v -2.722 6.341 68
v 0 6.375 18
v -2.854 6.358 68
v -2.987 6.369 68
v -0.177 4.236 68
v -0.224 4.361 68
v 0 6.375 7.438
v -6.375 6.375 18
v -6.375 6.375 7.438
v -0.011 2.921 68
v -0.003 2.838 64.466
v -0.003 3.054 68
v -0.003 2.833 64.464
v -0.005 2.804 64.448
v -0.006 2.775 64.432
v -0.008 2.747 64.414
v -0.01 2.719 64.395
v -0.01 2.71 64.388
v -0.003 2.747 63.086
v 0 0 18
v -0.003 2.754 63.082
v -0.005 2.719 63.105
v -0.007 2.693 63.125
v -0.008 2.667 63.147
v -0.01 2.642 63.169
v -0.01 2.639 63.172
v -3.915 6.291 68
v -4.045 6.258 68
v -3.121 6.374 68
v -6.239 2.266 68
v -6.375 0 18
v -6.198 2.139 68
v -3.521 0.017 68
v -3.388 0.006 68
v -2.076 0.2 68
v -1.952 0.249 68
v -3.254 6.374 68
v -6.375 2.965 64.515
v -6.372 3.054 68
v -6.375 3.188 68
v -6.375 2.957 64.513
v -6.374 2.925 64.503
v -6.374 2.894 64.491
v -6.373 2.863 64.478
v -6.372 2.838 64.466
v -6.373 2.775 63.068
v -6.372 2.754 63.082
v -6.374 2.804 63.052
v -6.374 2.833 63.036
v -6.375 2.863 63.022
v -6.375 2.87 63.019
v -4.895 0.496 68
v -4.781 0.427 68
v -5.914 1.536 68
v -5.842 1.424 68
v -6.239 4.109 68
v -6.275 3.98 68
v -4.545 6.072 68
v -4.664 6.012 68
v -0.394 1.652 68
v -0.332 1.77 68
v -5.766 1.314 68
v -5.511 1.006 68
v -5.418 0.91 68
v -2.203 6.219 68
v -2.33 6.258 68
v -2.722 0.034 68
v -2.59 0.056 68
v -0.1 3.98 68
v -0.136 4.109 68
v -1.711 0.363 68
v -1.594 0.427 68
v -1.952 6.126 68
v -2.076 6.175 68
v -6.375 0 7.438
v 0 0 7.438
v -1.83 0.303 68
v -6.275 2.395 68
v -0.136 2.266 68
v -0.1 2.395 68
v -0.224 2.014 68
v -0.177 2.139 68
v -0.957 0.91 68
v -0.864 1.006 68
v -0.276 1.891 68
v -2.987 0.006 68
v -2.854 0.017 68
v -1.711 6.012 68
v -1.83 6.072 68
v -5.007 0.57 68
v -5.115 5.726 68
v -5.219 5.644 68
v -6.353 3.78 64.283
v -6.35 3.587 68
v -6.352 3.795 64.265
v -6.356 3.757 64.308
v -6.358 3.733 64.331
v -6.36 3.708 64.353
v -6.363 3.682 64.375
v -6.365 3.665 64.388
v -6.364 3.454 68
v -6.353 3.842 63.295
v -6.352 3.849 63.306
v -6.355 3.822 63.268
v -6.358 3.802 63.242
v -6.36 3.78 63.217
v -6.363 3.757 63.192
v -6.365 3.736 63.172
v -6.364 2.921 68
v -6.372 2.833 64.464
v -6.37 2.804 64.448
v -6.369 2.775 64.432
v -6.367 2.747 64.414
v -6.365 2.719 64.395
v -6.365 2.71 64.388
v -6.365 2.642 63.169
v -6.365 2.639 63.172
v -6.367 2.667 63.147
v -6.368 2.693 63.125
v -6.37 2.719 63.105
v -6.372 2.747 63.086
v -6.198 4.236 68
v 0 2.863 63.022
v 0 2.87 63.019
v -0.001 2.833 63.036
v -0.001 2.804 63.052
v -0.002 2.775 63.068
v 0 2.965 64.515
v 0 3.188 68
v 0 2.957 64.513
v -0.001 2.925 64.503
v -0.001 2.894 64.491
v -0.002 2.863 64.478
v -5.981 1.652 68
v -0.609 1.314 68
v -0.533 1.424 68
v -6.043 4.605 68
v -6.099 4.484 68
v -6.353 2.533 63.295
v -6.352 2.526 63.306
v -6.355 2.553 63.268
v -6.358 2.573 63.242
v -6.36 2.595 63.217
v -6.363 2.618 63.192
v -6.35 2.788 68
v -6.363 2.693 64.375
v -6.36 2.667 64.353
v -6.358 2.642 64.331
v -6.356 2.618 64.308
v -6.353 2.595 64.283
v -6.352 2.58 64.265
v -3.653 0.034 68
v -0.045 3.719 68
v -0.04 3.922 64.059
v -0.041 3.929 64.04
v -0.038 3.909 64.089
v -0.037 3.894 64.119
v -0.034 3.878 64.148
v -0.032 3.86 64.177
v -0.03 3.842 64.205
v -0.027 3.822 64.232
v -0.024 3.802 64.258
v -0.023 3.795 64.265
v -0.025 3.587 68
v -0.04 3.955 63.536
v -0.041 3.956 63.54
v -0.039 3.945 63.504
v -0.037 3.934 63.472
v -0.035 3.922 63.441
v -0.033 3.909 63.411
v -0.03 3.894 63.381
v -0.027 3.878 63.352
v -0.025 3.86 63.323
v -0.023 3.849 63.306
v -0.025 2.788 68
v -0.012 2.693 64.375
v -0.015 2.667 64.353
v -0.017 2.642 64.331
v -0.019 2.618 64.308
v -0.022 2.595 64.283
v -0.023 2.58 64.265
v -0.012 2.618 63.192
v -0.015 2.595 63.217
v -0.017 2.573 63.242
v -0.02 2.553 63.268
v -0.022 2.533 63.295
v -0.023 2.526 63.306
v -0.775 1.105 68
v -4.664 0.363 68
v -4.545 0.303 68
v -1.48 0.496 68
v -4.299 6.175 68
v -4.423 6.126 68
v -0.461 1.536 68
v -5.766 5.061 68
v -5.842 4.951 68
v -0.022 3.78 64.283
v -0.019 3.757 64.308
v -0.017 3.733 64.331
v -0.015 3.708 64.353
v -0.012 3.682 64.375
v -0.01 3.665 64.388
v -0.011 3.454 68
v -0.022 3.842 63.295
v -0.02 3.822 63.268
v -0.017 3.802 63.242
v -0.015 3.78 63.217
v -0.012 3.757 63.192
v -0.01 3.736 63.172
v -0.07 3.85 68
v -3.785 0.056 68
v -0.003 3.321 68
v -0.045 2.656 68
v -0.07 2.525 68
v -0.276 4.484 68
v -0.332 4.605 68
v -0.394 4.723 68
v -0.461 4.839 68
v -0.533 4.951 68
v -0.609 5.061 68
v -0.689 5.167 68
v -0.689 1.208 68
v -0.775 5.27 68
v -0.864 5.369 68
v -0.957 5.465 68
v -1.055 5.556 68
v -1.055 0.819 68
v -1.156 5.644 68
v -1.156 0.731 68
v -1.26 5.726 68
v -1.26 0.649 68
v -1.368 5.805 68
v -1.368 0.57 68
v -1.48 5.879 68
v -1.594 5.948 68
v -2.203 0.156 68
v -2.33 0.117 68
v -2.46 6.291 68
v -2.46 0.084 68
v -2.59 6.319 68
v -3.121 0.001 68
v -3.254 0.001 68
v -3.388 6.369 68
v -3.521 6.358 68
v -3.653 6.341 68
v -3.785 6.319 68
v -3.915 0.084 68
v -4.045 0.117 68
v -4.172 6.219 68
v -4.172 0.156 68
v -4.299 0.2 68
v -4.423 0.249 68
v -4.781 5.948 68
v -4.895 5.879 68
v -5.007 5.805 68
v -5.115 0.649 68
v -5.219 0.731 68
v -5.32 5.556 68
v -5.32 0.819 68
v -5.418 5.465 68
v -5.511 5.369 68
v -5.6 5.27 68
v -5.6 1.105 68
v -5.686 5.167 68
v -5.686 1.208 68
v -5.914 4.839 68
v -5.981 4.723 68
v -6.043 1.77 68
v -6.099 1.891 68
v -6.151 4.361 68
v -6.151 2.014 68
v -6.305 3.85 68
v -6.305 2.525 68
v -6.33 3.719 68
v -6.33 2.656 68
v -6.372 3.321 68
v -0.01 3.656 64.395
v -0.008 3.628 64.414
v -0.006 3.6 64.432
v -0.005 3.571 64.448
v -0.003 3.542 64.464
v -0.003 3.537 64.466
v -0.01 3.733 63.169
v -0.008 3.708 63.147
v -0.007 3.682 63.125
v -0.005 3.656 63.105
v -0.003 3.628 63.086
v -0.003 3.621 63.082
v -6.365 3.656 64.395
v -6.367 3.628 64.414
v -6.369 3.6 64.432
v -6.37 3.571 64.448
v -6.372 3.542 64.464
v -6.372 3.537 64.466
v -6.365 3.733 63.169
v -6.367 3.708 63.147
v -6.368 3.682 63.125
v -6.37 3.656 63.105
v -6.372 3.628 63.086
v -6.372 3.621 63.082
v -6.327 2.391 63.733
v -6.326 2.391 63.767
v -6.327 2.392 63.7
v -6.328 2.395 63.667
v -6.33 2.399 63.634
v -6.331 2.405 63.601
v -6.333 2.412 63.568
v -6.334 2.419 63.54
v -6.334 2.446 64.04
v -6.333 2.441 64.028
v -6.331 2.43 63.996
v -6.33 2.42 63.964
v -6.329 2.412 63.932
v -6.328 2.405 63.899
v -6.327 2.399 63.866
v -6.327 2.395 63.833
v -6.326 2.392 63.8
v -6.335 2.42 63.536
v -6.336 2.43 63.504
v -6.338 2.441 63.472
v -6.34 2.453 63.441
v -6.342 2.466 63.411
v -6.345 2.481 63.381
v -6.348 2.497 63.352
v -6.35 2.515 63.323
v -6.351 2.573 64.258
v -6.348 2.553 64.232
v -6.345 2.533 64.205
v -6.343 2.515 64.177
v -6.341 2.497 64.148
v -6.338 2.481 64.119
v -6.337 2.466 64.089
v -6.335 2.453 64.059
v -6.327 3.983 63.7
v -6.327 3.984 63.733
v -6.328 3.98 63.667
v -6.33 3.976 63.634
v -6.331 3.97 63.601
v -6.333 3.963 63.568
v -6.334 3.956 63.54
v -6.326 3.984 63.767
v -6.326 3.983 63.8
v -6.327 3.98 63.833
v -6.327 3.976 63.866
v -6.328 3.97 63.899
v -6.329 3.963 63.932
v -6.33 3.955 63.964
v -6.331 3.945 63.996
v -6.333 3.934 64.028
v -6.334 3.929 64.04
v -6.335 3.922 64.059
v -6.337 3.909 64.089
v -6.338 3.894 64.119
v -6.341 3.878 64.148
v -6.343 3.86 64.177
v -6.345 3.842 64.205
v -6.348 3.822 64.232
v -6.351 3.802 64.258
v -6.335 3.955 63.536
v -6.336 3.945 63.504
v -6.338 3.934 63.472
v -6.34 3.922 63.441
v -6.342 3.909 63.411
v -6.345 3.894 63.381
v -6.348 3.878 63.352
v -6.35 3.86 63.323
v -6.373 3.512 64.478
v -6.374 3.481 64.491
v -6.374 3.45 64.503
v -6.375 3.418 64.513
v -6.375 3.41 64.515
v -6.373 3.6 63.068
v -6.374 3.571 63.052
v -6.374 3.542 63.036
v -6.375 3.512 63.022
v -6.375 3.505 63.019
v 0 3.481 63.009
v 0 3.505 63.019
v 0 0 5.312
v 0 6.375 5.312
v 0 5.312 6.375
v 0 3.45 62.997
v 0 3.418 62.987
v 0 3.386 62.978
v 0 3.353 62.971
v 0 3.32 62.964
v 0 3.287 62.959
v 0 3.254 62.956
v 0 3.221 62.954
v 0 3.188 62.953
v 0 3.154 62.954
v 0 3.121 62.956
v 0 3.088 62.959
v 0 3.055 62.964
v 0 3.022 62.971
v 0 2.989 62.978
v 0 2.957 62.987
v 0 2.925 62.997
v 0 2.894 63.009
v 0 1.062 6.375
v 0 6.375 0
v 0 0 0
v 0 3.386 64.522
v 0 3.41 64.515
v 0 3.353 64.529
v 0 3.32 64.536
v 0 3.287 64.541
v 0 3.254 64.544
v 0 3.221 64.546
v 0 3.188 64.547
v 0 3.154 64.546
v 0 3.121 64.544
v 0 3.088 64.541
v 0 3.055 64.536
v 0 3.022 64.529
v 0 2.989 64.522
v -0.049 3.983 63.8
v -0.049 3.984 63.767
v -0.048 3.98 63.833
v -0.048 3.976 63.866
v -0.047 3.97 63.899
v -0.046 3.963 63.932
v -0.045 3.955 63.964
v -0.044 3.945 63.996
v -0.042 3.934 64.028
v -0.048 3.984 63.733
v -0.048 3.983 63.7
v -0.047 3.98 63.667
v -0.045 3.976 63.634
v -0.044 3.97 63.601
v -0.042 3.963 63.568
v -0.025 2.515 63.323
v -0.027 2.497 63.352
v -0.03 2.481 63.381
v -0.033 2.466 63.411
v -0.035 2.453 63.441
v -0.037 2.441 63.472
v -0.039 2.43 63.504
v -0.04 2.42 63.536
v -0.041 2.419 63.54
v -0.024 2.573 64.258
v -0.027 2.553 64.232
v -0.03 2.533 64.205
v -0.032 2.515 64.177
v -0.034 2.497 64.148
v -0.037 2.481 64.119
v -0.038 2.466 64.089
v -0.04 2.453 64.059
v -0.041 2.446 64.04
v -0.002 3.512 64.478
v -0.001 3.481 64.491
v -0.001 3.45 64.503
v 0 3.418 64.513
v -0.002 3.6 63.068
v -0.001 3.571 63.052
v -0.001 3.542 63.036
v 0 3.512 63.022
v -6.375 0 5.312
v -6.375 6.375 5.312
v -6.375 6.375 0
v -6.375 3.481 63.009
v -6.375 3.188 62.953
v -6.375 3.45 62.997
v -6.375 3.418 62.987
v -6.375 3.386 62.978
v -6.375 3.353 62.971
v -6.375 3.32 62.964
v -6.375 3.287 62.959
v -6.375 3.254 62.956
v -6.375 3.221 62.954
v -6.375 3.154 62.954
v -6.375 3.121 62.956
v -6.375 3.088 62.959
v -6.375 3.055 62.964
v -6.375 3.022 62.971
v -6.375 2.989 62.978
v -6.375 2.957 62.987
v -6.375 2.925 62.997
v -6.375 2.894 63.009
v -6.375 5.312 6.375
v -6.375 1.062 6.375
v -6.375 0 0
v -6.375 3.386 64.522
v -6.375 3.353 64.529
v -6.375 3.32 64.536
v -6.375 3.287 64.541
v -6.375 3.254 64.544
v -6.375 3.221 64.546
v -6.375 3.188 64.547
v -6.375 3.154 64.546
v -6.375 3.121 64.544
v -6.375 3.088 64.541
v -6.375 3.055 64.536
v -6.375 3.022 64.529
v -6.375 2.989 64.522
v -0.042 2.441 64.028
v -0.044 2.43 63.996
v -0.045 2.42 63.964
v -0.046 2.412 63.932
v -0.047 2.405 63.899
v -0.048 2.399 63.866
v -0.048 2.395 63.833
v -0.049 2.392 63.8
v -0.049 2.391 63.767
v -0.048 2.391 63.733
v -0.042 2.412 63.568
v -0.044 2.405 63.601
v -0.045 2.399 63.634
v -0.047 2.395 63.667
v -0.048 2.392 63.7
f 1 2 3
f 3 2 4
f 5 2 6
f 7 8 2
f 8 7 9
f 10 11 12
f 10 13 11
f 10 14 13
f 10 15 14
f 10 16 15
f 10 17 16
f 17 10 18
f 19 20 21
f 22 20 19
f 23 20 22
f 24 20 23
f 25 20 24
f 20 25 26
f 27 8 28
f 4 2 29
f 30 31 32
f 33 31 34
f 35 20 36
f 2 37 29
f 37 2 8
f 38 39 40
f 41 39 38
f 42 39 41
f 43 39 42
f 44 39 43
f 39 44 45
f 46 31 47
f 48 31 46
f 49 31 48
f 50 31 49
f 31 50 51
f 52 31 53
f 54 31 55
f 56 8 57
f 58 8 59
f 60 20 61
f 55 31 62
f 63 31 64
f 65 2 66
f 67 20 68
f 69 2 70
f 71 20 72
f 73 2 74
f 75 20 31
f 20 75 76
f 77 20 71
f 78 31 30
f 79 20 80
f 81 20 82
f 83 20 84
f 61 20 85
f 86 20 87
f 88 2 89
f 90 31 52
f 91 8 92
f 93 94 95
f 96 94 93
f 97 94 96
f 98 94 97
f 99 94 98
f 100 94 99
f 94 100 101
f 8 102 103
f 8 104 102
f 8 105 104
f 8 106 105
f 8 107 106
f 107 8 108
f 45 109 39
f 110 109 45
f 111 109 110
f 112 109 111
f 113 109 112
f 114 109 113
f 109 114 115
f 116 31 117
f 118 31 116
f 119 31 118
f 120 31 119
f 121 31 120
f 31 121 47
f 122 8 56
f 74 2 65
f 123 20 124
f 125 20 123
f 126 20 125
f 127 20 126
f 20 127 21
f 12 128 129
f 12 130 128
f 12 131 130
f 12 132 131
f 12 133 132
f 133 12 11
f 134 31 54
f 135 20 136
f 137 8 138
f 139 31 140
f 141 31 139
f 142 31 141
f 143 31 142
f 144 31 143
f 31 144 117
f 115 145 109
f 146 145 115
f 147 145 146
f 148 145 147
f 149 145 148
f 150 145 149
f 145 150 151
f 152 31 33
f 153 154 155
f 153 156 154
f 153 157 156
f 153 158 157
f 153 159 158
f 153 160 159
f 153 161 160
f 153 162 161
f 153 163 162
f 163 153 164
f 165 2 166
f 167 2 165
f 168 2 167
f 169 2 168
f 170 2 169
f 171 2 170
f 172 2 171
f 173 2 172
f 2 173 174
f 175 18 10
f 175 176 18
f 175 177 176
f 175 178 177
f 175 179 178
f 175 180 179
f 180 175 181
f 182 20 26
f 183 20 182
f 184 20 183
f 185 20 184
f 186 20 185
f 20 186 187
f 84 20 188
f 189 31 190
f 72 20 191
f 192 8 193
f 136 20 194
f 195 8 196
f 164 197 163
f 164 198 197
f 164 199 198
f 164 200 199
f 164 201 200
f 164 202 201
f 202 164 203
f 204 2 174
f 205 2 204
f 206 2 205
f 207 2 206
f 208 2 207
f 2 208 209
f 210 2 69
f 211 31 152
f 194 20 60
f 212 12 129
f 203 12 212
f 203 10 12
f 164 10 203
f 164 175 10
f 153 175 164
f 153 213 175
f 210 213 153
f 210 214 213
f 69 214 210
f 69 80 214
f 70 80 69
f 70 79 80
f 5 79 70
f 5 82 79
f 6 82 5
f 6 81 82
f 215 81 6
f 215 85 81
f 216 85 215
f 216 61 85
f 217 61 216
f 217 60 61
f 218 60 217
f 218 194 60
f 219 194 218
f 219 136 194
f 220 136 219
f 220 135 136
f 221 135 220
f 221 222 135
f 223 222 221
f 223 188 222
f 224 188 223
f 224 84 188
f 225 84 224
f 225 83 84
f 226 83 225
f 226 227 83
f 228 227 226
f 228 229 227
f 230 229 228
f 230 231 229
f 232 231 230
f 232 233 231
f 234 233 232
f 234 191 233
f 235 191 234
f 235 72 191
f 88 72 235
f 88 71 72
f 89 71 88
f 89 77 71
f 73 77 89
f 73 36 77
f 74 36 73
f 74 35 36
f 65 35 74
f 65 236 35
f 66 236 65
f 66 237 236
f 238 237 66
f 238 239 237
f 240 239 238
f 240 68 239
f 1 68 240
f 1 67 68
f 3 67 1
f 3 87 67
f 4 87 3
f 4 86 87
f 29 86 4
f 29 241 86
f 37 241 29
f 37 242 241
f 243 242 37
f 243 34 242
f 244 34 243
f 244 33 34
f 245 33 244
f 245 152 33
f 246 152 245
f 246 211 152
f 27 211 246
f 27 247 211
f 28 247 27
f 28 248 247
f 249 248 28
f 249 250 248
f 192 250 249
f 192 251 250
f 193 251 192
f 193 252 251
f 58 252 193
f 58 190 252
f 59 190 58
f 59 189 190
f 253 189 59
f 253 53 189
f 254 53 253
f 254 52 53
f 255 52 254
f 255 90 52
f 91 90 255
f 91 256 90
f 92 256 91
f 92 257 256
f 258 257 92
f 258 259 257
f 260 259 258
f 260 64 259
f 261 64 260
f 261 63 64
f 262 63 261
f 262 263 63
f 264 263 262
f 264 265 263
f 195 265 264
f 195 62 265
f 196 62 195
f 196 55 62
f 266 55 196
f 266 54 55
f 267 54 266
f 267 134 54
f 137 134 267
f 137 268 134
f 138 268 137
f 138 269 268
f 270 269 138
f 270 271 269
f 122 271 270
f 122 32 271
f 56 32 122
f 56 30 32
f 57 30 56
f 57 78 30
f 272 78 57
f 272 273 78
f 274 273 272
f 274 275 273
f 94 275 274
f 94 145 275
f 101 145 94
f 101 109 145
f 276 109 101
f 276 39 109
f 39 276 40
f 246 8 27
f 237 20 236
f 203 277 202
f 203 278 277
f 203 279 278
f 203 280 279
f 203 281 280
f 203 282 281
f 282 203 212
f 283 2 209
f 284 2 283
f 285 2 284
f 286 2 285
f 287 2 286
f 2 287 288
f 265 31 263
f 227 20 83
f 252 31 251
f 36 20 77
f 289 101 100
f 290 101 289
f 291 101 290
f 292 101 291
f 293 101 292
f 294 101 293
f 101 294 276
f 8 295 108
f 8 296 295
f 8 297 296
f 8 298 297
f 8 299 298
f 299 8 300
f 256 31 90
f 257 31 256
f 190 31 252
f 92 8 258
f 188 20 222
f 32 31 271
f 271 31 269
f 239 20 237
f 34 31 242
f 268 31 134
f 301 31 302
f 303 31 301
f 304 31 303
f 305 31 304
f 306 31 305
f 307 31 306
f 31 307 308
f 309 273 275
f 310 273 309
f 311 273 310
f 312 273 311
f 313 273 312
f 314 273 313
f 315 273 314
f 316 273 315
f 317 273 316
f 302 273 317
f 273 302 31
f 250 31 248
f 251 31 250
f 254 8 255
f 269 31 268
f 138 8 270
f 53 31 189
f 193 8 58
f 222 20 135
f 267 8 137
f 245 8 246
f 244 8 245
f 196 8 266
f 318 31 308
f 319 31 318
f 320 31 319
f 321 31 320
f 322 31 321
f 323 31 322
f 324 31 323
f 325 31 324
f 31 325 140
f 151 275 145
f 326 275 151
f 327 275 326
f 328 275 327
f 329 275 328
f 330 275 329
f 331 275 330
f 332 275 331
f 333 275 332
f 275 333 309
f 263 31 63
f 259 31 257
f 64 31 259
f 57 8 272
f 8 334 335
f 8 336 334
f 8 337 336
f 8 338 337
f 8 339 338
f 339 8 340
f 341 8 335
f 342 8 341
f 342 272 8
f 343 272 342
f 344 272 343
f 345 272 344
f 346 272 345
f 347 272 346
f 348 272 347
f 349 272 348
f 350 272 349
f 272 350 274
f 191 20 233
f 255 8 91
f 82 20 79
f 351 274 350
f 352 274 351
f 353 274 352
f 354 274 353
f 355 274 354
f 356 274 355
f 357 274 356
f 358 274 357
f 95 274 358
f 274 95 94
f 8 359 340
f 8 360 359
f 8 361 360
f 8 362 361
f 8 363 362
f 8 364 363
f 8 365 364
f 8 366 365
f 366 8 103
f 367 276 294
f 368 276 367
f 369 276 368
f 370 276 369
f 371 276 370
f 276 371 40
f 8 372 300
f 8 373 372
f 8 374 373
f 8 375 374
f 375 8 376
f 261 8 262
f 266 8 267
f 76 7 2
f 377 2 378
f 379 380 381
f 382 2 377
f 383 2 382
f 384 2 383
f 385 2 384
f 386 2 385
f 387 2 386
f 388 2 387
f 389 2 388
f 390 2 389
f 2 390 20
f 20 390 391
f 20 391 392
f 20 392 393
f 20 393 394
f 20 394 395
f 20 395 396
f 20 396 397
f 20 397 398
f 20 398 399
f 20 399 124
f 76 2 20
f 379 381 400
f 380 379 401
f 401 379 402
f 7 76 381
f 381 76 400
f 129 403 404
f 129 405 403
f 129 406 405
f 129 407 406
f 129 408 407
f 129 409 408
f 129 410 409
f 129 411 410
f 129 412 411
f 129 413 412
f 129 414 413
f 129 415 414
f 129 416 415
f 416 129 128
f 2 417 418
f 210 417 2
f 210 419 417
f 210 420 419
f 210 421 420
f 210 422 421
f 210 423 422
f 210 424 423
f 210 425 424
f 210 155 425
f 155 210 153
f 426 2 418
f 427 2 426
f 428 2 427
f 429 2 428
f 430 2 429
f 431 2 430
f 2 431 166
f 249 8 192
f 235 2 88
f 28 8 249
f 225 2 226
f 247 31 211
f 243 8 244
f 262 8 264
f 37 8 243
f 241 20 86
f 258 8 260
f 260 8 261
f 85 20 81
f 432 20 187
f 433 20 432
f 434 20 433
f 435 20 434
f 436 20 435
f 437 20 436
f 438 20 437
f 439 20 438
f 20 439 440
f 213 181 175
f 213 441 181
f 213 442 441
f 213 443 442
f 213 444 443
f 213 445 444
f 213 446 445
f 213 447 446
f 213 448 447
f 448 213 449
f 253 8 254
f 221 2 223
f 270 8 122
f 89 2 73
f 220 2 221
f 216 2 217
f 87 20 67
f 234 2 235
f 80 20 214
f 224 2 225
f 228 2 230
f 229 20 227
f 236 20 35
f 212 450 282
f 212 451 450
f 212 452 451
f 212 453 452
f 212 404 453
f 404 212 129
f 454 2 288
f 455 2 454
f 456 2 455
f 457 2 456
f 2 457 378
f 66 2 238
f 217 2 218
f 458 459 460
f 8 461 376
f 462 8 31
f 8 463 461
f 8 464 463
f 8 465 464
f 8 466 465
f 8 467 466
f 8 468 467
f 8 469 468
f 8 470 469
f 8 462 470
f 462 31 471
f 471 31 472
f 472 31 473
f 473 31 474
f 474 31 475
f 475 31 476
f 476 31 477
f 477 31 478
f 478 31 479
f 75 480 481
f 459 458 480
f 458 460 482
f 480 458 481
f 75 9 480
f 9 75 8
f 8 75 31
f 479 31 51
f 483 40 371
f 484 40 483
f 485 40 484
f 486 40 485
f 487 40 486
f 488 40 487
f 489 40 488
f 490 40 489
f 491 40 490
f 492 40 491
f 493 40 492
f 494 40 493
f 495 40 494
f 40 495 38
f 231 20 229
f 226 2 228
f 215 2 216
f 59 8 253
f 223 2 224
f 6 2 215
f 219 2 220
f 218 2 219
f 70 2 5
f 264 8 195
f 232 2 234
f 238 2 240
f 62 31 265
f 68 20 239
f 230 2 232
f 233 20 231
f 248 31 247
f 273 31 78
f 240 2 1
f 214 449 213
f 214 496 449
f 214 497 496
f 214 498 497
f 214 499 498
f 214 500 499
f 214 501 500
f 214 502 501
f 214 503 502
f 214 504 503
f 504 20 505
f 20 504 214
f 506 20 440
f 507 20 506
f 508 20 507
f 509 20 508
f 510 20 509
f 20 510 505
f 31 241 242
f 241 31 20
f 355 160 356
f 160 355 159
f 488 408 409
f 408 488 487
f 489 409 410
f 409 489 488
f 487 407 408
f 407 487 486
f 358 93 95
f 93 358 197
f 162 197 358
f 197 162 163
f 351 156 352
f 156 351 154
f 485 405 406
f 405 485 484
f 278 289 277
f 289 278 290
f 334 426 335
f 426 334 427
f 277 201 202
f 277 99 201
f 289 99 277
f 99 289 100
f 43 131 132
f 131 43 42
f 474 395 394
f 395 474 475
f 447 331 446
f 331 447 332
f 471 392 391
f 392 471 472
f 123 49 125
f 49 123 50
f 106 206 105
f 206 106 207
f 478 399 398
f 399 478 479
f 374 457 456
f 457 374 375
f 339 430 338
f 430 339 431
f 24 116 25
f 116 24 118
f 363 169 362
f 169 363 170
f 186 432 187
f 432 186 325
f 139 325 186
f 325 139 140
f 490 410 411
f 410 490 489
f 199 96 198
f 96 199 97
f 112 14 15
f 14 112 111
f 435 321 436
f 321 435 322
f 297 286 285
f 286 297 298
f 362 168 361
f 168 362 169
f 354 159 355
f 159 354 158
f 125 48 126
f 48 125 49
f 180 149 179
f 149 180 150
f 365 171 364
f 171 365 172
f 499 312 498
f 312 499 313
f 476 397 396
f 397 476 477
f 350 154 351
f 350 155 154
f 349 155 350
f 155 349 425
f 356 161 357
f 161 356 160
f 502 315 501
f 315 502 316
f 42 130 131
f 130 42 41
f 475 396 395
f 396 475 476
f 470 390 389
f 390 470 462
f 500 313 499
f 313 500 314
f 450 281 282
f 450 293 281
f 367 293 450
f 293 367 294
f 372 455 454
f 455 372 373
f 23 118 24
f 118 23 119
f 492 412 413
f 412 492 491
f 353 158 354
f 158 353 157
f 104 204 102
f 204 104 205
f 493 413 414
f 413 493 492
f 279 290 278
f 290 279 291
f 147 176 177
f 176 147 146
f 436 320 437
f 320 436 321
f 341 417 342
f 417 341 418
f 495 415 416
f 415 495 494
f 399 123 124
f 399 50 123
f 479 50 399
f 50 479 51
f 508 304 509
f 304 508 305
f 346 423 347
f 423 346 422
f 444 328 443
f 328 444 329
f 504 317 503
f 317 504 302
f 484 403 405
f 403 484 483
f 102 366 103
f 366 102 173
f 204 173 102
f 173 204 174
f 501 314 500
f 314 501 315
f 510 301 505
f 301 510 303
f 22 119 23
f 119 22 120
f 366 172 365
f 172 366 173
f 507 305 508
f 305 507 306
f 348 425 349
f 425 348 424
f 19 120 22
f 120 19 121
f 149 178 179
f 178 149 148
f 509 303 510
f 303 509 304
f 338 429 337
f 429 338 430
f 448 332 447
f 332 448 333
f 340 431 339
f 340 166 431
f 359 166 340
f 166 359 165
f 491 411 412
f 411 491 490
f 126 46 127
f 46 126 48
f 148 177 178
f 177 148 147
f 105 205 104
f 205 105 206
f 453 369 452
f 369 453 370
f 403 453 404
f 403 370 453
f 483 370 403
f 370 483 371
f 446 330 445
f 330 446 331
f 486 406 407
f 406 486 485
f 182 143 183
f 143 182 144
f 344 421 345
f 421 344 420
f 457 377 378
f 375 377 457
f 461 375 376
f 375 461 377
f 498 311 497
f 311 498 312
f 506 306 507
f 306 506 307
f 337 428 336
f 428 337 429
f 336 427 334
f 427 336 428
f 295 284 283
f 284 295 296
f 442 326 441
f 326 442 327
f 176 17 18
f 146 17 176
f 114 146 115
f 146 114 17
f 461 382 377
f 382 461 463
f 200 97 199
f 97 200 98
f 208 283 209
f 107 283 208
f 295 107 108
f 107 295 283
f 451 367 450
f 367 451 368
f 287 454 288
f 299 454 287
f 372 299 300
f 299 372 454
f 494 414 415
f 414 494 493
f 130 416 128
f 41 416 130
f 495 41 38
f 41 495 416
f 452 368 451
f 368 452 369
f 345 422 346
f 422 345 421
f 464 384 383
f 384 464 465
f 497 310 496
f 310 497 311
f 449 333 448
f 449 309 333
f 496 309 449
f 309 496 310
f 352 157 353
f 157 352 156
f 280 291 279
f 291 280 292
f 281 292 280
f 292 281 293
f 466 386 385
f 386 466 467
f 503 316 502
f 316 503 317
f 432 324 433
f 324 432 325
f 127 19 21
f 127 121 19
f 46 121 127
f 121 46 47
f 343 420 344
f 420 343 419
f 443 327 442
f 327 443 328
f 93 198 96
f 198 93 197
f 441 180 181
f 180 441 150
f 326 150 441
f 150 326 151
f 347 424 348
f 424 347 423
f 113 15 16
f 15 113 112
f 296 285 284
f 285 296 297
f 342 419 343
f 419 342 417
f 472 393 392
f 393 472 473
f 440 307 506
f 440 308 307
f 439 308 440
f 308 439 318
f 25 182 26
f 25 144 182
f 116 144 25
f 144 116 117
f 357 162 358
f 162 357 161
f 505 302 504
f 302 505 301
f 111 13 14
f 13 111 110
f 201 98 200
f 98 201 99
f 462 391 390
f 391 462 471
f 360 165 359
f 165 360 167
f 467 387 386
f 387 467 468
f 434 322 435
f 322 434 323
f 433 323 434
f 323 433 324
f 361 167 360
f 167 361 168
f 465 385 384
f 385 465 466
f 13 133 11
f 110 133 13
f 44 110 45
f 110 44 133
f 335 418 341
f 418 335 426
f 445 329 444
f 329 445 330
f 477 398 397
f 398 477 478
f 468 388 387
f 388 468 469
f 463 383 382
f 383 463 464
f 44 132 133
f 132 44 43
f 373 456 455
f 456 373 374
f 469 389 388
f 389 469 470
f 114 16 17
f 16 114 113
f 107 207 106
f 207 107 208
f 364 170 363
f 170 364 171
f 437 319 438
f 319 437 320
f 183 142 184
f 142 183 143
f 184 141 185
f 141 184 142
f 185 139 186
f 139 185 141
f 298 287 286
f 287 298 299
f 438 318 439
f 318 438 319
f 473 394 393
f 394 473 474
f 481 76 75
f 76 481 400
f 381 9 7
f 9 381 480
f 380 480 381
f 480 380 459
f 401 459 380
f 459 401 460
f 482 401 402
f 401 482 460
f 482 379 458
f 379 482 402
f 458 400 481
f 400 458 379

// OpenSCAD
$fn = 150;

rotate(a = [0, -90, 0]) {
	union() {
		color(alpha = 1.0, c = "#00ff77") {
			linear_extrude(height = 6.375) {
				polygon(points = [[0, 0], [0, 6.375], [5.3125, 6.375], [6.375, 5.3125], [7.4375, 6.375], [7.4375, 0], [6.375, 1.0625], [5.3125, 0]]);
			}
		}
		translate(v = [7.4375, 0, 0]) {
			color(alpha = 1.0, c = "#0077ff") {
				cube(size = [9.5625, 6.375, 6.375]);
			}
		}
		translate(v = [17.0, 0, 0]) {
			difference() {
				color(alpha = 1.0, c = "#770077") {
					hull() {
						cube(size = [1, 6.375, 6.375]);
						translate(v = [50.0, 3.1875, 3.1875]) {
							rotate(a = [0, 90, 0]) {
								cylinder(d = 6.375, h = 1);
							}
						}
					}
				}
				translate(v = [46.75, 3.1875, -1]) {
					cylinder(d = 1.59375, h = 8.375);
				}
			}
		}
	}
}
